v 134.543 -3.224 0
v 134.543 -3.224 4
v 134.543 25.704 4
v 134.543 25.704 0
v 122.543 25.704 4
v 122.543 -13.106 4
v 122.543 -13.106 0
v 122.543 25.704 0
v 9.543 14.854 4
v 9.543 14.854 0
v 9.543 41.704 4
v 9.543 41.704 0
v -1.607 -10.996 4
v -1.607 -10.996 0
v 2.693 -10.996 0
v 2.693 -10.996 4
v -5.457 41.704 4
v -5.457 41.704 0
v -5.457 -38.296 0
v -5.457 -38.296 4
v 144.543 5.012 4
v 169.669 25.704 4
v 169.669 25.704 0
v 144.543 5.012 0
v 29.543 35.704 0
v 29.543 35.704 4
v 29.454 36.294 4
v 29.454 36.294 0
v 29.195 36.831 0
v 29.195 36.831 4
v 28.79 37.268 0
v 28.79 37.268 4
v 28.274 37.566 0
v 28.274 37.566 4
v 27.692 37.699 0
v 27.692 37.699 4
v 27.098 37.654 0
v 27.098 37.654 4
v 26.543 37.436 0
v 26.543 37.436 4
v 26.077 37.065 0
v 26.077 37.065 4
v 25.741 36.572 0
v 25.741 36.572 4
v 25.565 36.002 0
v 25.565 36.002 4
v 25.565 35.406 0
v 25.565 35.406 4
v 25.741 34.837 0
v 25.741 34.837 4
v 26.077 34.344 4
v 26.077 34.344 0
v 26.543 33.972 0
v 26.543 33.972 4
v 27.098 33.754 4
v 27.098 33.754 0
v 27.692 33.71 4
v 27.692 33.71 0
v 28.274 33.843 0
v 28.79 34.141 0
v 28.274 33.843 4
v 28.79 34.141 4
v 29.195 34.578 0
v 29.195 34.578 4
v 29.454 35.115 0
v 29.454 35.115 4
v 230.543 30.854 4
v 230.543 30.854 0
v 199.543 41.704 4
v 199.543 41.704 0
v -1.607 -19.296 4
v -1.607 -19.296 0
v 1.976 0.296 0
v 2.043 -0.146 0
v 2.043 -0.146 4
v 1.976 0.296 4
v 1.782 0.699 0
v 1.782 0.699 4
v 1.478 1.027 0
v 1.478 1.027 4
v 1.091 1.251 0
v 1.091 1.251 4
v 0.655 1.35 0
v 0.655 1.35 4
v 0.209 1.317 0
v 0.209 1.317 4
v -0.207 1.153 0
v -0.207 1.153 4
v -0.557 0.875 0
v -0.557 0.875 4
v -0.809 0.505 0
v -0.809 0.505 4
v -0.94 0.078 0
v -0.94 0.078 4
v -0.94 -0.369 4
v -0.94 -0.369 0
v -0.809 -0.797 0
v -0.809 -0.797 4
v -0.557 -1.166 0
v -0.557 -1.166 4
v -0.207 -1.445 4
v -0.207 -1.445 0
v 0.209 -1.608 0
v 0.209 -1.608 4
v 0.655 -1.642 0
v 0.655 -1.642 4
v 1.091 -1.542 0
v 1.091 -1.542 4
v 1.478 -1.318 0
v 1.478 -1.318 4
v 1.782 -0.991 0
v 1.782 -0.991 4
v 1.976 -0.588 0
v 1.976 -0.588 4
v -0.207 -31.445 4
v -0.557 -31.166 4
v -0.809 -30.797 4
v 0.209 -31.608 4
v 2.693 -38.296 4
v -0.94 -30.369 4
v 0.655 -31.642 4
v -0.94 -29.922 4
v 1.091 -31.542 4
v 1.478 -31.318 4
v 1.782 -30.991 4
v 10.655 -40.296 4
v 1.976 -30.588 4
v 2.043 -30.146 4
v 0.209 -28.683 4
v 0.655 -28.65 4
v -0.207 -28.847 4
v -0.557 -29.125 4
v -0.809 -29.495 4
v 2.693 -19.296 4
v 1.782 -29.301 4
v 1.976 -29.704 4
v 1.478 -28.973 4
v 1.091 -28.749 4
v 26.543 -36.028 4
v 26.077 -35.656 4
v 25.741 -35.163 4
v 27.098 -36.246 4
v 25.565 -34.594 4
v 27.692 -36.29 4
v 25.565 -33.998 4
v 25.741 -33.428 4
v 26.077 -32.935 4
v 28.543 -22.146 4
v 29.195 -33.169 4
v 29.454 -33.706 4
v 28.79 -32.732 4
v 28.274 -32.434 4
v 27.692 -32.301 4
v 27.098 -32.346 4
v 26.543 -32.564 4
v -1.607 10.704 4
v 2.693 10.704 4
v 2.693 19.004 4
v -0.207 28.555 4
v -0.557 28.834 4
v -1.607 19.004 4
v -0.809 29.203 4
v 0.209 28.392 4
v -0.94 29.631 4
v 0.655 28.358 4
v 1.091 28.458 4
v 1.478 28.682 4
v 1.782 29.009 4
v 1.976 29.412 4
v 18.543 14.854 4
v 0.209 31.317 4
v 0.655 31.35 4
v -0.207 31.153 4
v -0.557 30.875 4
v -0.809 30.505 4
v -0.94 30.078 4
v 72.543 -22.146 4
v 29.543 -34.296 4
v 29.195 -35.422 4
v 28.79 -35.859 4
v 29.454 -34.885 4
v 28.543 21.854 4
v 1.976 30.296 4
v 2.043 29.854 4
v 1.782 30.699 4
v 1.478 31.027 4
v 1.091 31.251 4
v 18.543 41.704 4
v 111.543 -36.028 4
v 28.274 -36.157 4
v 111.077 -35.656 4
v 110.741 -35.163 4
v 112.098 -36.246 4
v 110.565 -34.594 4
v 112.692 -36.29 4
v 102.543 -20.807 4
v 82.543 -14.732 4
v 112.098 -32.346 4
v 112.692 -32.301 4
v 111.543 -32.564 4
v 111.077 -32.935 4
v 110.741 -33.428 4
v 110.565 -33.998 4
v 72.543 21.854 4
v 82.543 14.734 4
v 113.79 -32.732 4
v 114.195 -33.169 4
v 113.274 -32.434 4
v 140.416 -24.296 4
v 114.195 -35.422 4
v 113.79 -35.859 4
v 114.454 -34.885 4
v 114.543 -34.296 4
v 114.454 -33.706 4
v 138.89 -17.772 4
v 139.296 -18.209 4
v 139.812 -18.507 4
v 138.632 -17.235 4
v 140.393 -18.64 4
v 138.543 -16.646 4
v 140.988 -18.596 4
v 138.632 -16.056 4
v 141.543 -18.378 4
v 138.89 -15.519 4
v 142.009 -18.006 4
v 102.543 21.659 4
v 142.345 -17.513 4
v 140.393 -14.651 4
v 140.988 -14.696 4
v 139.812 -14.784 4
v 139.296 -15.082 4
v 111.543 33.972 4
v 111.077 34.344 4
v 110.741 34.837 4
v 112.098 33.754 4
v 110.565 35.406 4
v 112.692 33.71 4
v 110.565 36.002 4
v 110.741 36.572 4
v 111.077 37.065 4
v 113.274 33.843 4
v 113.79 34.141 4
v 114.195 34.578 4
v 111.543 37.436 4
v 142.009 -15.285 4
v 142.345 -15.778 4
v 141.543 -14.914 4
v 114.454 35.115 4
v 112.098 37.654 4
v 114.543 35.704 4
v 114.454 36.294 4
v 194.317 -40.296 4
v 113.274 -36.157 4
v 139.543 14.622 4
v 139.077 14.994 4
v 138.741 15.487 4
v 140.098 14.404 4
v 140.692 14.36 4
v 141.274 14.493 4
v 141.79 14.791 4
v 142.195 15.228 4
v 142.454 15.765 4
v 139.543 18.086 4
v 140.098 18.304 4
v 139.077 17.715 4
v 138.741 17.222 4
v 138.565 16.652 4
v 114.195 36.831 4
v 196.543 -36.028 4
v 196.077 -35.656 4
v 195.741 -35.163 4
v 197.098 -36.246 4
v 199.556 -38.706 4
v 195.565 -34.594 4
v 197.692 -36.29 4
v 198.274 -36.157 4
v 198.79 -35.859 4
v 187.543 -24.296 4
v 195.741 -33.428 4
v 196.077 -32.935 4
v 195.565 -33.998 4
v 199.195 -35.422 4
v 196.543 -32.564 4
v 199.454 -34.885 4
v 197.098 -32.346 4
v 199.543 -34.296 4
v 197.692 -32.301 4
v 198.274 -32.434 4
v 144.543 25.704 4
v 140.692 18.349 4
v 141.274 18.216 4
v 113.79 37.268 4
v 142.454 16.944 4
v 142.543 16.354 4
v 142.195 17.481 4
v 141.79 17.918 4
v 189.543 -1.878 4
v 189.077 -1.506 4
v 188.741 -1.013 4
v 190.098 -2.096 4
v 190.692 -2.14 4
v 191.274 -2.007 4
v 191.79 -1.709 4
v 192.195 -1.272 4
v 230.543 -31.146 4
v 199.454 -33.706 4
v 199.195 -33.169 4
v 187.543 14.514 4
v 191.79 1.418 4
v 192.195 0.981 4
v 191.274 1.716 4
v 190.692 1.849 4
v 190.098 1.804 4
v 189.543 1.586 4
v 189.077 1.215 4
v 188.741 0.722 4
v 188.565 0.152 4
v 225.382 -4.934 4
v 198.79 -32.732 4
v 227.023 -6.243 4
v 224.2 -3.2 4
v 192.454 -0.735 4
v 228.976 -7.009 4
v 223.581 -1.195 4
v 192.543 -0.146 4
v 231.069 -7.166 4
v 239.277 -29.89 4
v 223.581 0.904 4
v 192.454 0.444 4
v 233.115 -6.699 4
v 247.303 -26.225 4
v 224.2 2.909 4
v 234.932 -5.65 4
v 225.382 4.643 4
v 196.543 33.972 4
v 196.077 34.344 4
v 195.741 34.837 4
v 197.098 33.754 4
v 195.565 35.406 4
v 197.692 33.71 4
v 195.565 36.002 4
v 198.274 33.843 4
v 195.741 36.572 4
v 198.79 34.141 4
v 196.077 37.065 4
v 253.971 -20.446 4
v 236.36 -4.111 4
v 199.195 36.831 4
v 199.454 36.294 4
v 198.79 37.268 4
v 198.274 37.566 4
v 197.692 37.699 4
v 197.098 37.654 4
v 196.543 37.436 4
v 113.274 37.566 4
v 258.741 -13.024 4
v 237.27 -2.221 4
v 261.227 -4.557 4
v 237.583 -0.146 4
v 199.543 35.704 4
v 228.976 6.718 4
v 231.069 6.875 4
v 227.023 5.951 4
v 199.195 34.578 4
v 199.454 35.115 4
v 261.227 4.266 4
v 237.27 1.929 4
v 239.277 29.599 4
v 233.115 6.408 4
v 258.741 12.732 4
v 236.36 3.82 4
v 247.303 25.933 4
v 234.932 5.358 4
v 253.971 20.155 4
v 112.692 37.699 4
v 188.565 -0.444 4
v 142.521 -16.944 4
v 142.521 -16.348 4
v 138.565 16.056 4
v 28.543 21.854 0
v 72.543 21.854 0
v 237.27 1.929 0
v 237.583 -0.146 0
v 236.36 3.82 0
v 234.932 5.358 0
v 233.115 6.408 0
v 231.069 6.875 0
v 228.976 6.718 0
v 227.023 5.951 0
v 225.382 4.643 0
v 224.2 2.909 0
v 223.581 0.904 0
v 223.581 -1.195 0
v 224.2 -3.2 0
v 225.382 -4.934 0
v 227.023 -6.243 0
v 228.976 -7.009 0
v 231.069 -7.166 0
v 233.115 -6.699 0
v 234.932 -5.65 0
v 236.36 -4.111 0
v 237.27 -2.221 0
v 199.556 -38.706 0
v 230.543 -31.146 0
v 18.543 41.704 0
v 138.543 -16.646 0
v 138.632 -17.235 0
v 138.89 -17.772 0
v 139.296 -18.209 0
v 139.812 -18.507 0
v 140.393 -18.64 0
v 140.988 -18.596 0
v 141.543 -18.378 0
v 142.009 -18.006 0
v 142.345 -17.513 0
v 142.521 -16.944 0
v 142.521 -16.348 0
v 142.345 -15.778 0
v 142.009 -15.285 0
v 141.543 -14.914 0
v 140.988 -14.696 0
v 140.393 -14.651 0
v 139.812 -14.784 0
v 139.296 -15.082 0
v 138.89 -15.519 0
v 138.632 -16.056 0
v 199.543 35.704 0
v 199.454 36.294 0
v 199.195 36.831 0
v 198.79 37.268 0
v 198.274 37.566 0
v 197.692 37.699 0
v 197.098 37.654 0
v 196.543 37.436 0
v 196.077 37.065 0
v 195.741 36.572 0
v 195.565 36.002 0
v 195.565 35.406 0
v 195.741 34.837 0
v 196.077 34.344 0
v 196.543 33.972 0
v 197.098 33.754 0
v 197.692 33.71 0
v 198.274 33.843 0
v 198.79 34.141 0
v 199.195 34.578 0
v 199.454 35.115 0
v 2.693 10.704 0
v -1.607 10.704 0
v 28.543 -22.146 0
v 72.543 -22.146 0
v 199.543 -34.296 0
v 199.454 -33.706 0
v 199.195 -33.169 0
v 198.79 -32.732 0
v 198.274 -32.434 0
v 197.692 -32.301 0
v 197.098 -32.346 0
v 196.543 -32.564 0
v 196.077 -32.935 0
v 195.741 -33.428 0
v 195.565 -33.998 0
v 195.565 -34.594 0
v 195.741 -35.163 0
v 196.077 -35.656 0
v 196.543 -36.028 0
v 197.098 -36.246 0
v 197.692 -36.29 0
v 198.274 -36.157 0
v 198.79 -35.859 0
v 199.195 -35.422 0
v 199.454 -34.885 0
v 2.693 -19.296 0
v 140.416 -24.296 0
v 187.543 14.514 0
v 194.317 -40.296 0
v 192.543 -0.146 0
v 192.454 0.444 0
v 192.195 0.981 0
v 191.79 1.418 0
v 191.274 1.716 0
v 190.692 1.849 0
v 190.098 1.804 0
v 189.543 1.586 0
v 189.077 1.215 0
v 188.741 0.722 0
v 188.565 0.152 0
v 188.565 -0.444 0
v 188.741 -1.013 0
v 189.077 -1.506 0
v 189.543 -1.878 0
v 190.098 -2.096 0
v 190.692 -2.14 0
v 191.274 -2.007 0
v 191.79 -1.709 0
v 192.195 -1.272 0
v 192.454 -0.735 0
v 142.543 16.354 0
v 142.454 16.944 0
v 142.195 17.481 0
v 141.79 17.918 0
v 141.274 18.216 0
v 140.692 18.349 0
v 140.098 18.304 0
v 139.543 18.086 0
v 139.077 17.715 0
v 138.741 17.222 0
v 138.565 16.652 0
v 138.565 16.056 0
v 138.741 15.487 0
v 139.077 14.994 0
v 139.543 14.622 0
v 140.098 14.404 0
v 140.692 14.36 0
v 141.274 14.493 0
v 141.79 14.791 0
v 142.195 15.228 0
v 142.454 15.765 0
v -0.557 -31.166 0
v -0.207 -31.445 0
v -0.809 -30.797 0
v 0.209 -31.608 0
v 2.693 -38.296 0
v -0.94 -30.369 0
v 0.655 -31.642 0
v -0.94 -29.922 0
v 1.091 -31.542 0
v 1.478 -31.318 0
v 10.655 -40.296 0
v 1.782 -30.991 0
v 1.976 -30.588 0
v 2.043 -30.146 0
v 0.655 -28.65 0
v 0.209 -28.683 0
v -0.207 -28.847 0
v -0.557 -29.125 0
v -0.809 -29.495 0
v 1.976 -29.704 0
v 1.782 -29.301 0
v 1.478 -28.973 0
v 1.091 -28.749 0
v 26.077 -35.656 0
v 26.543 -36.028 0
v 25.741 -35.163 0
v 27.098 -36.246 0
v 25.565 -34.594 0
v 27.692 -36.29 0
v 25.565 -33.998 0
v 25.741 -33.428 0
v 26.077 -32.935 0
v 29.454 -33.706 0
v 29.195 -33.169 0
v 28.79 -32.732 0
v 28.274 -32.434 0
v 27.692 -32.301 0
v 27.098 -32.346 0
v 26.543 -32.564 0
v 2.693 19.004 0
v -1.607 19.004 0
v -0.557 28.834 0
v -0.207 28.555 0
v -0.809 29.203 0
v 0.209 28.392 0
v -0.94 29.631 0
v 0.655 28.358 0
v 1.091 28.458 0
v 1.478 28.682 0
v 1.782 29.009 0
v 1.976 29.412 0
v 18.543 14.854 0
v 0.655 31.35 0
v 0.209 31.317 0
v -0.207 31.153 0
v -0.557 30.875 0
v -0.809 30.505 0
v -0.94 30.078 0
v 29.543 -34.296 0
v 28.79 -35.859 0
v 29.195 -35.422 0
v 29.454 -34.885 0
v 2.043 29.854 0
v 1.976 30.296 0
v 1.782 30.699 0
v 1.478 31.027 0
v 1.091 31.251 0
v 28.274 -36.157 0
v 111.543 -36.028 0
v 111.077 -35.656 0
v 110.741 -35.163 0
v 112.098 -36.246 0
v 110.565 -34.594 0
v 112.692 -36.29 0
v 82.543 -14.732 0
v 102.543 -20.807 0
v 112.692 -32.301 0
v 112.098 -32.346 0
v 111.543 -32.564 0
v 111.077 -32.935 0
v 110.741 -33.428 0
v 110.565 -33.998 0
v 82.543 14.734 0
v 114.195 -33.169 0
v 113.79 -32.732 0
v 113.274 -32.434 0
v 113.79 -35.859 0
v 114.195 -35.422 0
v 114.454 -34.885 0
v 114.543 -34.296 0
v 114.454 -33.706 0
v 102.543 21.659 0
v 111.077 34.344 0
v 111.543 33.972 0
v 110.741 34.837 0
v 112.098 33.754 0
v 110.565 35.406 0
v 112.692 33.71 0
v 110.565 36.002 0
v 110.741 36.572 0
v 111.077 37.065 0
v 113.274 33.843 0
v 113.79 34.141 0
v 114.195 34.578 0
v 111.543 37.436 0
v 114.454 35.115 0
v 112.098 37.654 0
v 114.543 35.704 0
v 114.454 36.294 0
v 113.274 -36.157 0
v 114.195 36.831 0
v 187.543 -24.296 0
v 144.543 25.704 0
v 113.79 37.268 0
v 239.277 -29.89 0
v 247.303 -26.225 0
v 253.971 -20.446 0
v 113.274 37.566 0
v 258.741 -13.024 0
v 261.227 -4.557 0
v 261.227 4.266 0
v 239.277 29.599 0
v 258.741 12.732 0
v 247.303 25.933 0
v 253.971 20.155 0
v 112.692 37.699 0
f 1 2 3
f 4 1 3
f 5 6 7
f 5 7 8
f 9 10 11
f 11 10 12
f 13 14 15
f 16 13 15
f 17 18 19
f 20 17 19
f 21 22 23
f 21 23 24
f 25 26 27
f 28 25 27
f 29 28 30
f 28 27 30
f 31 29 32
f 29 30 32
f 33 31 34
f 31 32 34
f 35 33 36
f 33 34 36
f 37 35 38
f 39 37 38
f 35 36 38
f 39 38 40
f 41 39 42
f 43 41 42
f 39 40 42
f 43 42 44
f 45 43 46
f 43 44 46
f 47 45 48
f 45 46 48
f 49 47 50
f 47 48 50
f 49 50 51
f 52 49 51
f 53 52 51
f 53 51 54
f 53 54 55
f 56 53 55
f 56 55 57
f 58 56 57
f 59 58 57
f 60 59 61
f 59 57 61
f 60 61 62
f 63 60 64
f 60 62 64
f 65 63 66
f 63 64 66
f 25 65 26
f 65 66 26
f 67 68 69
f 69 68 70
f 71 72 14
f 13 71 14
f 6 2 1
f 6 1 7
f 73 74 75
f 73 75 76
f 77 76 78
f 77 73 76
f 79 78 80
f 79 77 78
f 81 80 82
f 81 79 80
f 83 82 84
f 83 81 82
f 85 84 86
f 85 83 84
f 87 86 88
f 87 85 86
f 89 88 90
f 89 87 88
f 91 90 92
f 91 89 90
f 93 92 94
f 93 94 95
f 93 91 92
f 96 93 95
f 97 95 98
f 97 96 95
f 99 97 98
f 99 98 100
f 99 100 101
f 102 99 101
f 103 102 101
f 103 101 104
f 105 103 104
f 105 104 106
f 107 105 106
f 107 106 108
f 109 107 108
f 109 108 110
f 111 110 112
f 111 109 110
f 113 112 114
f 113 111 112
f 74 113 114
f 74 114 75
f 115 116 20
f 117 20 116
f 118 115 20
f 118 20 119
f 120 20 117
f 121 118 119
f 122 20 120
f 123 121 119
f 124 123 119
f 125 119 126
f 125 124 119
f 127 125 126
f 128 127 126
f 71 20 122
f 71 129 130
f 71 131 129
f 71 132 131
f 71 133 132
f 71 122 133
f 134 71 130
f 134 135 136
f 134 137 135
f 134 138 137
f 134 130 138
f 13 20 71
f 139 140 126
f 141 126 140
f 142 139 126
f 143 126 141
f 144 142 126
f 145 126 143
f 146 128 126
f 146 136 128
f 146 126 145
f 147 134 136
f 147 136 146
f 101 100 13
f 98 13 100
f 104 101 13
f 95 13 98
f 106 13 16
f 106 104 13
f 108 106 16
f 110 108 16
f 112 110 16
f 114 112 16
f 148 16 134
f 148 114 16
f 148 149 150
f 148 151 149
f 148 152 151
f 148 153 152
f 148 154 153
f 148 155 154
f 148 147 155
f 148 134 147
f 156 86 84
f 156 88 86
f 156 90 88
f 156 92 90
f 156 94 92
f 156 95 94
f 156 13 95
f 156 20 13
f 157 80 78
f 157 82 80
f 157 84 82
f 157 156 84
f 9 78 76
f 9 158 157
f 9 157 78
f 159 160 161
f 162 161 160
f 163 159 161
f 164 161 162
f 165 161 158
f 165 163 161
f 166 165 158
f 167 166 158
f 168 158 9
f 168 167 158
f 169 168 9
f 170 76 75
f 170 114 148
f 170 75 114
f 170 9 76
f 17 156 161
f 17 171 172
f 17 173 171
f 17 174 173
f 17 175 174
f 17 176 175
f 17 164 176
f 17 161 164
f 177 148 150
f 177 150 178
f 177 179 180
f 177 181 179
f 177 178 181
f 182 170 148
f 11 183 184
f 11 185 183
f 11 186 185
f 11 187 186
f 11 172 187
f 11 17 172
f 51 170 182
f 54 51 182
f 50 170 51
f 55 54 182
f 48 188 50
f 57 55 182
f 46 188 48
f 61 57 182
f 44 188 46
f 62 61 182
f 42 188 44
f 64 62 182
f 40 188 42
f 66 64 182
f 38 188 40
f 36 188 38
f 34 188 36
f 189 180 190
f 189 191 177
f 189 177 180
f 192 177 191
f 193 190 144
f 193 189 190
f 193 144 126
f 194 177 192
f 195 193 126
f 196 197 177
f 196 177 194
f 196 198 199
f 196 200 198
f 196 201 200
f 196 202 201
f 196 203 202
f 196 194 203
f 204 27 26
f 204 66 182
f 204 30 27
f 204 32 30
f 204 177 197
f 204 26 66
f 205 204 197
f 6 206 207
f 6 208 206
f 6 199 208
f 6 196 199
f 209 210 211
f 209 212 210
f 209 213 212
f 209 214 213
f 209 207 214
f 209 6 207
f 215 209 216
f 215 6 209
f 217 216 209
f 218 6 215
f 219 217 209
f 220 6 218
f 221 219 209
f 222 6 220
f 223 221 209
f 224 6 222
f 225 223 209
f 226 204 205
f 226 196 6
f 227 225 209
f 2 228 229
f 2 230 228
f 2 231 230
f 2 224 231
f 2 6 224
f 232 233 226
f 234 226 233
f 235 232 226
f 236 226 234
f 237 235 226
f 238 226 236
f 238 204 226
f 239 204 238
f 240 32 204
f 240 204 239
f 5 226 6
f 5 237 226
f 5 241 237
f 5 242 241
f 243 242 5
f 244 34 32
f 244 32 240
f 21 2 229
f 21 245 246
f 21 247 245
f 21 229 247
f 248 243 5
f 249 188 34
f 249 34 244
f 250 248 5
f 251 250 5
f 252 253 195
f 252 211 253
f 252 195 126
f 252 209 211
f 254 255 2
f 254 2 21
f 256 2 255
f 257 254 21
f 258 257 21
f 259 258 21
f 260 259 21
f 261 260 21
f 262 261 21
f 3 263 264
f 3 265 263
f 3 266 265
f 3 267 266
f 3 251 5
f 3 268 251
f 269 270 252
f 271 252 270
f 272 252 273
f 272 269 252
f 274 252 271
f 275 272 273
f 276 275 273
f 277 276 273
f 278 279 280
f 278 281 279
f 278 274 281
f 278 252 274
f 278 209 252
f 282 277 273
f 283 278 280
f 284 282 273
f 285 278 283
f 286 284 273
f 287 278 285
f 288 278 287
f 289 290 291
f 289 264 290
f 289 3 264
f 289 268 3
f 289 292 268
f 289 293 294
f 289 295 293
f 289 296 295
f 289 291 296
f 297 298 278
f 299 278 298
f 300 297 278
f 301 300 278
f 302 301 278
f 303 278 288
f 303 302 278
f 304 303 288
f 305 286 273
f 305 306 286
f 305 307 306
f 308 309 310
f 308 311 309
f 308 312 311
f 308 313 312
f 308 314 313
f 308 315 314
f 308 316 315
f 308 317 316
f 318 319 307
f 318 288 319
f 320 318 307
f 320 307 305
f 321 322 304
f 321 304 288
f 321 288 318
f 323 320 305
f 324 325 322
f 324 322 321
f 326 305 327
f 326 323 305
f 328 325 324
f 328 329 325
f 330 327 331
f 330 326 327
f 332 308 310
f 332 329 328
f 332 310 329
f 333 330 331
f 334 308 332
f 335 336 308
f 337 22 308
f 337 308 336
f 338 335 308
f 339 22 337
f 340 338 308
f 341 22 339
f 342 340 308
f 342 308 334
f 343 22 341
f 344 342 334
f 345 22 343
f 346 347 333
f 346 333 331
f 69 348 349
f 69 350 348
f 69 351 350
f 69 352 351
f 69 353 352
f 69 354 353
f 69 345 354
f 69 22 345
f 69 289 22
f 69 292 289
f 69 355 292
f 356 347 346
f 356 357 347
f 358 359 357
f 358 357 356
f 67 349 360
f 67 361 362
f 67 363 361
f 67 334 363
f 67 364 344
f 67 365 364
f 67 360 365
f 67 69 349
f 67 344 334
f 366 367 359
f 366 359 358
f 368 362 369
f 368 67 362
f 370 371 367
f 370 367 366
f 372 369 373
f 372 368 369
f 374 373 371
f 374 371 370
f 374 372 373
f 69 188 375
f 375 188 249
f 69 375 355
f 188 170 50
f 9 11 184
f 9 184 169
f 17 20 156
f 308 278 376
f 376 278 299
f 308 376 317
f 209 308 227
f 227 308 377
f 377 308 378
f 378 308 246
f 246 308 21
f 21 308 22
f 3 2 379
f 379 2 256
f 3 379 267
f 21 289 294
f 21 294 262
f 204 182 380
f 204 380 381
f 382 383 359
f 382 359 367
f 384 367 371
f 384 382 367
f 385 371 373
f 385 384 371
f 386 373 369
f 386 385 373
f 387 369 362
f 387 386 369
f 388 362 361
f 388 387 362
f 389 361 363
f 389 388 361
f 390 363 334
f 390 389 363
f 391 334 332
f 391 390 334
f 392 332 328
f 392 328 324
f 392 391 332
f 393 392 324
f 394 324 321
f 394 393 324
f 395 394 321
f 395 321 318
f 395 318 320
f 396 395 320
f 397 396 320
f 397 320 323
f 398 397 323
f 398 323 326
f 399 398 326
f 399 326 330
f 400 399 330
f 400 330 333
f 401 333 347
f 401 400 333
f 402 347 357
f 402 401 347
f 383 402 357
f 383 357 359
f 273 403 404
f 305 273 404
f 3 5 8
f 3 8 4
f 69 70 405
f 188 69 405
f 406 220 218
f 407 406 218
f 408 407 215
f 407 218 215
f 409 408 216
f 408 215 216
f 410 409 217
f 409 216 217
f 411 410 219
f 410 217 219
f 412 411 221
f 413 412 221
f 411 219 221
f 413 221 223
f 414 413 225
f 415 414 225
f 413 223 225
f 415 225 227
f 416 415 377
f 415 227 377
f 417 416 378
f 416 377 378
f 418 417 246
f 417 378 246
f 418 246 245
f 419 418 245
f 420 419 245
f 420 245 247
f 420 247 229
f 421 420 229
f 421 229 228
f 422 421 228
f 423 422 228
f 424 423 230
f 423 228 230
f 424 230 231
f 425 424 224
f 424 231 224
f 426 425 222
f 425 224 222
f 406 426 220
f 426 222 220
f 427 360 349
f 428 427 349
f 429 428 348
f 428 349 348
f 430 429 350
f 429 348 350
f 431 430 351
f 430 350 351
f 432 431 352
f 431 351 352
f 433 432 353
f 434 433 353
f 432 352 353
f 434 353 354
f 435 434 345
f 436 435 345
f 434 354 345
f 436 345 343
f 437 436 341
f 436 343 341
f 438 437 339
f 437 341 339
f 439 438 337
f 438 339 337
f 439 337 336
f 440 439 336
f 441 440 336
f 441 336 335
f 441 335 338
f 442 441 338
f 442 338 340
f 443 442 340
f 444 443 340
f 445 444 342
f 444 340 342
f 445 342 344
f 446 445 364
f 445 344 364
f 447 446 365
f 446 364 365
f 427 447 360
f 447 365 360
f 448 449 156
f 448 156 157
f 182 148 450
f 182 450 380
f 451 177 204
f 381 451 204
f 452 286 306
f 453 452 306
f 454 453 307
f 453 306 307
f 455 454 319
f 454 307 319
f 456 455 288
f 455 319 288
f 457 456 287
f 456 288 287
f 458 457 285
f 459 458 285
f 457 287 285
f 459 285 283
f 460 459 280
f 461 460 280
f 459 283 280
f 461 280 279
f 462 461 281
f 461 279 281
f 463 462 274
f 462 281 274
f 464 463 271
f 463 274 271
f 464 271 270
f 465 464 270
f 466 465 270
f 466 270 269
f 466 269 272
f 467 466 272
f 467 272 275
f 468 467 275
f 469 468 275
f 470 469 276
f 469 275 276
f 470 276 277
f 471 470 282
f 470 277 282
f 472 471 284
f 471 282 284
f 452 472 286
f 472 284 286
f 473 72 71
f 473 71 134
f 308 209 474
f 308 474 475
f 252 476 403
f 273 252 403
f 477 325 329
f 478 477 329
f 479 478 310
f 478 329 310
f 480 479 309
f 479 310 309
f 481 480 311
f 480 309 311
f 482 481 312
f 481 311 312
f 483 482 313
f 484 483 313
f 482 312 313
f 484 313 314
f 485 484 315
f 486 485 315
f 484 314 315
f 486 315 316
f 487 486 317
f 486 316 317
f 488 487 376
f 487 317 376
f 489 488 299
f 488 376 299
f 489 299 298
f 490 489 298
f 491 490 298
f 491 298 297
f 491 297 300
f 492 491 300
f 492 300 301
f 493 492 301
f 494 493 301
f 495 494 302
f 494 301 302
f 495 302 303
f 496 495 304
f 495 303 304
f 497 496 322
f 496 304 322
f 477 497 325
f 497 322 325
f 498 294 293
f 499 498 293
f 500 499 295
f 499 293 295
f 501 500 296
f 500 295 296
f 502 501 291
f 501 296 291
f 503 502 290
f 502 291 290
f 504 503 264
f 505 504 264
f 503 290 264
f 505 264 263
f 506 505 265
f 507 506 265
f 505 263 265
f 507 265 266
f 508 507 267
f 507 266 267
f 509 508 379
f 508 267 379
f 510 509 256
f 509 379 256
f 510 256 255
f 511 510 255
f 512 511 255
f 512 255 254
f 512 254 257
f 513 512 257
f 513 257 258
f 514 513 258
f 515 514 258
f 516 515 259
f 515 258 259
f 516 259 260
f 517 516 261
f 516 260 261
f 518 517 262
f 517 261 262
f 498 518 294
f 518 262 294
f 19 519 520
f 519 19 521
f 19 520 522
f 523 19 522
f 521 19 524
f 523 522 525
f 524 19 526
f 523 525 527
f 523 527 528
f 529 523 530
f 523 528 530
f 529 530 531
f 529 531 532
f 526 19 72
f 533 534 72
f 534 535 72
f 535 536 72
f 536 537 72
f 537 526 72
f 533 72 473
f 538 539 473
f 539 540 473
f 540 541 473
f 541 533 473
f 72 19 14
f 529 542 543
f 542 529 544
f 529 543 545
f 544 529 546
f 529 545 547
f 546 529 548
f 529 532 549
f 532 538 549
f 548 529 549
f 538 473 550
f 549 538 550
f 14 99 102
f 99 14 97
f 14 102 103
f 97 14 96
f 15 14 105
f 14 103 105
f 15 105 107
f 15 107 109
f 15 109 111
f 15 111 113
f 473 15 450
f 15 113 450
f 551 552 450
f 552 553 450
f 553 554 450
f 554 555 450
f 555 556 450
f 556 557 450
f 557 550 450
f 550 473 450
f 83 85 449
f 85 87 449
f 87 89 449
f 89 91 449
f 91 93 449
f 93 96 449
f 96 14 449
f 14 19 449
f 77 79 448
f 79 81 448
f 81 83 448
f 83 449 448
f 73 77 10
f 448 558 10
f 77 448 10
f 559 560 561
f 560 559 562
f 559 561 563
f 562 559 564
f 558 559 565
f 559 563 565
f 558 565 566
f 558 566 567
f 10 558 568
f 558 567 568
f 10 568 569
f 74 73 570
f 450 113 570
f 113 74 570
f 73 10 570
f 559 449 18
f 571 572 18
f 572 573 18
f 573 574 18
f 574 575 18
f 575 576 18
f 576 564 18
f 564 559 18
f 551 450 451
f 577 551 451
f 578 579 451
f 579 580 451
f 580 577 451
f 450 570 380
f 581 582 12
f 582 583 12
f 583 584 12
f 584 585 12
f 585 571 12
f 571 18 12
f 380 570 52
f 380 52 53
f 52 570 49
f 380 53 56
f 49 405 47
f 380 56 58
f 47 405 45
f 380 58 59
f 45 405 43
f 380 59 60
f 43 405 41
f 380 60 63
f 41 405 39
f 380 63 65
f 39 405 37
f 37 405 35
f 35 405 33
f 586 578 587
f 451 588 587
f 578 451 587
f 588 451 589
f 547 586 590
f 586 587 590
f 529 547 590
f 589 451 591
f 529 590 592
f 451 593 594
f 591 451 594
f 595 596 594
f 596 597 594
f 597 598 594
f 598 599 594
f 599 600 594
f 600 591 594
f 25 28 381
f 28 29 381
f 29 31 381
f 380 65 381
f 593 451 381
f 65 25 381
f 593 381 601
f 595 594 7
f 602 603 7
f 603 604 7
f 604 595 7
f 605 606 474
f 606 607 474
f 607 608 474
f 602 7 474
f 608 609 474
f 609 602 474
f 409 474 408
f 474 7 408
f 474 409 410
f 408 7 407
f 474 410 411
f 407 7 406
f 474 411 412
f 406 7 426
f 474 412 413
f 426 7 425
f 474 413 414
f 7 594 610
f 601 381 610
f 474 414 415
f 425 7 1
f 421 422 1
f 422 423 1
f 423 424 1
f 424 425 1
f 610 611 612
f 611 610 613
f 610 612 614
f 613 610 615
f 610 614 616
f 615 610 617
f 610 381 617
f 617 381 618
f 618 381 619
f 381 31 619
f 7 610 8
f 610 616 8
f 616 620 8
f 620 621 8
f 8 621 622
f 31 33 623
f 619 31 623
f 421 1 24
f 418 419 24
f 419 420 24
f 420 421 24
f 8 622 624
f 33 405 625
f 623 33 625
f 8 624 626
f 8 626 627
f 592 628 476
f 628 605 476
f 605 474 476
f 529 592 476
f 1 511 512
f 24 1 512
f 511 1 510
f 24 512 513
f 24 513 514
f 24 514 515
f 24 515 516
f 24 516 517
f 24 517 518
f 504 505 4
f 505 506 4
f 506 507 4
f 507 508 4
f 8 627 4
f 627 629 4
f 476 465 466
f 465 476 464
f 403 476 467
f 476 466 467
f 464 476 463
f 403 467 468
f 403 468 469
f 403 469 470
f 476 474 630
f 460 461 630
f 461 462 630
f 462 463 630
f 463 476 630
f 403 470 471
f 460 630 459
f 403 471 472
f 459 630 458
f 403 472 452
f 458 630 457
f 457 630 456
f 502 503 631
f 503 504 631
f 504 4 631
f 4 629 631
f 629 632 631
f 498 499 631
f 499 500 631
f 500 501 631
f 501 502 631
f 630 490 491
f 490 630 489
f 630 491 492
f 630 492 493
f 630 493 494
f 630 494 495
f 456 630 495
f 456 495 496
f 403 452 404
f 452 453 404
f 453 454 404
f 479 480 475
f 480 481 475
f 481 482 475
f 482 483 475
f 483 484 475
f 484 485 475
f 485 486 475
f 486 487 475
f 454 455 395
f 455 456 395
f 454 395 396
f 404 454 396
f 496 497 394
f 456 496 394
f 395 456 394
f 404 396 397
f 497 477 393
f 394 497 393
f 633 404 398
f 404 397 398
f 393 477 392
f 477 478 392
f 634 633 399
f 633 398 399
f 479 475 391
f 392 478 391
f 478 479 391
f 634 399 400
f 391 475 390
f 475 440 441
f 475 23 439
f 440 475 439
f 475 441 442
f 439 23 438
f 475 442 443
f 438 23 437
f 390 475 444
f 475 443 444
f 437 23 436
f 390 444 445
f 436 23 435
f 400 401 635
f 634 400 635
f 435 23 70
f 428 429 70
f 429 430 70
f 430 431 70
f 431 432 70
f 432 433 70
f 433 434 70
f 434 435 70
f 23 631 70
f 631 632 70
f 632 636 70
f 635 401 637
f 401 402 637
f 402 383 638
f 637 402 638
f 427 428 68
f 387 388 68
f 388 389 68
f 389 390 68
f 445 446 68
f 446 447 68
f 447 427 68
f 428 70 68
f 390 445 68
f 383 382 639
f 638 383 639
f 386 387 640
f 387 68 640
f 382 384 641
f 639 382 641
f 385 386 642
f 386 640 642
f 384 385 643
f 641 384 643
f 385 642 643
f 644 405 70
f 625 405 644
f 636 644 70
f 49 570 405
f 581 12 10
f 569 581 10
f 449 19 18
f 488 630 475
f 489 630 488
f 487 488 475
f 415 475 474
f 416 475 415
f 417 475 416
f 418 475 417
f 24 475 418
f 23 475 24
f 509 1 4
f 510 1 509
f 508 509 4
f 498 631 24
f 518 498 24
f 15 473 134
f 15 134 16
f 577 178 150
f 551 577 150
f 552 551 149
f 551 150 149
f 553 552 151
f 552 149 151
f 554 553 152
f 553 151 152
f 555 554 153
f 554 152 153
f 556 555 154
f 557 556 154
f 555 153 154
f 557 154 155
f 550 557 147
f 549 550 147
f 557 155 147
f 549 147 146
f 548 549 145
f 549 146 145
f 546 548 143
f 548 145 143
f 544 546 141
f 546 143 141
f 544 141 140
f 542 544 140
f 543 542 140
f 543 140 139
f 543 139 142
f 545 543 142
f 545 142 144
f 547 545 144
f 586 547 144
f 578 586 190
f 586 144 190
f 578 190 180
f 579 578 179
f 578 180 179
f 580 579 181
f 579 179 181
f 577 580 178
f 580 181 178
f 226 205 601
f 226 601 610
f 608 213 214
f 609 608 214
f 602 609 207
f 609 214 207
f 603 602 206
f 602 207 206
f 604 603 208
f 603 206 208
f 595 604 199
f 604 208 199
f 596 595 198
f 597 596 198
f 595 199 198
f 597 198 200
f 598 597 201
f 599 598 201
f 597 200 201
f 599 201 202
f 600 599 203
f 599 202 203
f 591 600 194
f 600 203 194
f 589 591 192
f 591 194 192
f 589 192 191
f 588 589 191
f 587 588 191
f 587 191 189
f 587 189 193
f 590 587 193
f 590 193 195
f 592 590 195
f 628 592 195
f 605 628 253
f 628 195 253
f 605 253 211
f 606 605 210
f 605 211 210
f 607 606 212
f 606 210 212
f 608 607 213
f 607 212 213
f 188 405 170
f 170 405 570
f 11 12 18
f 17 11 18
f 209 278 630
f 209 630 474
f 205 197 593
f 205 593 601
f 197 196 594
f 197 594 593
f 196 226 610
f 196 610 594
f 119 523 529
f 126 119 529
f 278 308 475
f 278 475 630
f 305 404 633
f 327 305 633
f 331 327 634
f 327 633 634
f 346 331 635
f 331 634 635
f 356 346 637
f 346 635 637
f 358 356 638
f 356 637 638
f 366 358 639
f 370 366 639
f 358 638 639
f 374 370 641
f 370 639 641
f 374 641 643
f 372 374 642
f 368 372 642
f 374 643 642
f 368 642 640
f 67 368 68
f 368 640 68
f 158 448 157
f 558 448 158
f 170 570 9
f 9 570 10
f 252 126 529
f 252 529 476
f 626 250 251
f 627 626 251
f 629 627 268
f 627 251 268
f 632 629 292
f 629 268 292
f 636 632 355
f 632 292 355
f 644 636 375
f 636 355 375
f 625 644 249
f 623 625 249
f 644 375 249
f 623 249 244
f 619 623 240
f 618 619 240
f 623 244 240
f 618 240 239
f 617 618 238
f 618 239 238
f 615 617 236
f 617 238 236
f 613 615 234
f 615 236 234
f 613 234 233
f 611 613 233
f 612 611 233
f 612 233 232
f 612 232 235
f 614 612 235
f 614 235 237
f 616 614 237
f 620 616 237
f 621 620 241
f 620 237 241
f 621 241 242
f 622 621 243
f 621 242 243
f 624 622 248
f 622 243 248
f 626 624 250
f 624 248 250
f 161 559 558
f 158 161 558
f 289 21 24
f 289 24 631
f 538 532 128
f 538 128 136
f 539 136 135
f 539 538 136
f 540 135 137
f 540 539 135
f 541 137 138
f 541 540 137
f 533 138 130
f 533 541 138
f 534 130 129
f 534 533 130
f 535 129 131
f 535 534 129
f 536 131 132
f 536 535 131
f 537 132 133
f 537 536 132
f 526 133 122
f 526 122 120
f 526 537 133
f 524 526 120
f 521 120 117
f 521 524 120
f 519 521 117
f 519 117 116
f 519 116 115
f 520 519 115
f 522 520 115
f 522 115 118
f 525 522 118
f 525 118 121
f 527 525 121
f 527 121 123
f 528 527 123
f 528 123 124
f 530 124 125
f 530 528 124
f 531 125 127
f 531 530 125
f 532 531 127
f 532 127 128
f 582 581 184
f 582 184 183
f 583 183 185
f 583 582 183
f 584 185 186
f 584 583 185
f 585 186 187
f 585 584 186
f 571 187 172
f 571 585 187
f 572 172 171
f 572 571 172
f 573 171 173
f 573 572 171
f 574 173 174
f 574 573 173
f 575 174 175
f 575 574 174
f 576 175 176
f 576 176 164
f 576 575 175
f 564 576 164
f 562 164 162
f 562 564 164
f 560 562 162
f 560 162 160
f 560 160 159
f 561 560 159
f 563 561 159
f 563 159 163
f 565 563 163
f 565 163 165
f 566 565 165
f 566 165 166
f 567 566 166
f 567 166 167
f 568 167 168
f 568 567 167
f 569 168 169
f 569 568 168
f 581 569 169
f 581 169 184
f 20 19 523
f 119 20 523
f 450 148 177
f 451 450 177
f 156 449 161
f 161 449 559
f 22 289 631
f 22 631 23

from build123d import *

# Parameters (mm, degrees)
EXTRUDE_1_OUTLINE_R   = 1.5
EXTRUDE_1_OUTLINE_W   = 4.3
EXTRUDE_1_OUTLINE_H   = 8.3
EXTRUDE_1_OUTLINE_R_2 = 11.5
EXTRUDE_1_OUTLINE_R_3 = 7.04
EXTRUDE_1_DEPTH       = 4
SKETCH_2_W            = 44
SKETCH_2_H            = 44
CUT_EXTRUDE_1_DEPTH   = 4
SKETCH_3_R            = 2
CUT_EXTRUDE_2_DEPTH   = 4
SKETCH_4_W            = 10
SKETCH_4_H            = 47.093490756
EXTRUDE_2_DEPTH       = 4
SKETCH_7_R            = 2
CUT_EXTRUDE_3_DEPTH   = 4


# Read off the part's stored shape, not the designer's step: 凸台-拉伸1
with BuildPart() as part:
    # 凸台-拉伸1 outline → 凸台-拉伸1 (new body)
    with BuildSketch(Plane.XY):
        with BuildLine():
            Line((174.542857143, -46.295714286), (199.556073527, -38.70591431))
            Line((199.556073527, -38.70591431), (230.542857143, -31.145714286))
            ThreePointArc((230.542857143, -31.145714286), (261.542857143, -0.145714286), (230.542857143, 30.854285714))
            Line((230.542857143, 30.854285714), (199.542857143, 41.704285714))
            Line((199.542857143, 41.704285714), (18.542857143, 41.704285714))
            Line((18.542857143, 41.704285714), (18.542857143, 14.854285714))
            Line((18.542857143, 14.854285714), (9.542857143, 14.854285714))
            Line((9.542857143, 14.854285714), (9.542857143, 41.704285714))
            Line((9.542857143, 41.704285714), (-5.457142857, 41.704285714))
            Line((-5.457142857, 41.704285714), (-5.457142857, -38.295714286))
            Line((-5.457142857, -38.295714286), (2.692857143, -38.295714286))
            Line((2.692857143, -38.295714286), (34.542857143, -46.295714286))
            Line((34.542857143, -46.295714286), (174.542857143, -46.295714286))
        make_face()
        with Locations((0.542857143, -30.145714286)):
            Circle(EXTRUDE_1_OUTLINE_R, mode=Mode.SUBTRACT)
        with Locations((0.542857143, -15.145714286)):
            Rectangle(EXTRUDE_1_OUTLINE_W, EXTRUDE_1_OUTLINE_H, mode=Mode.SUBTRACT)
        with Locations((50.542857143, -14.145714286)):
            Circle(EXTRUDE_1_OUTLINE_R, mode=Mode.SUBTRACT)
        with Locations((0.542857143, -0.145714286)):
            Circle(EXTRUDE_1_OUTLINE_R, mode=Mode.SUBTRACT)
        with Locations((36.542857143, -0.145714286)):
            Circle(EXTRUDE_1_OUTLINE_R, mode=Mode.SUBTRACT)
        with Locations((50.542857143, -0.145714286)):
            Circle(EXTRUDE_1_OUTLINE_R_2, mode=Mode.SUBTRACT)
        with Locations((0.542857143, 14.854285714)):
            Rectangle(EXTRUDE_1_OUTLINE_W, EXTRUDE_1_OUTLINE_H, mode=Mode.SUBTRACT)
        with Locations((50.542857143, 13.854285714)):
            Circle(EXTRUDE_1_OUTLINE_R, mode=Mode.SUBTRACT)
        with Locations((64.542857143, -0.145714286)):
            Circle(EXTRUDE_1_OUTLINE_R, mode=Mode.SUBTRACT)
        with Locations((0.542857143, 29.854285714)):
            Circle(EXTRUDE_1_OUTLINE_R, mode=Mode.SUBTRACT)
        with Locations((230.542857143, -0.145714286)):
            Circle(EXTRUDE_1_OUTLINE_R_3, mode=Mode.SUBTRACT)
    extrude(amount=EXTRUDE_1_DEPTH)

    # 草图2 → 切除-拉伸1 (cut)
    with BuildSketch(Plane.XY.offset(4)):
        with Locations((50.542857143, -0.145714286)):
            Rectangle(SKETCH_2_W, SKETCH_2_H)
    extrude(amount=-CUT_EXTRUDE_1_DEPTH, mode=Mode.SUBTRACT)

    # 草图3 → 切除-拉伸2 (cut)
    with BuildSketch(Plane.XY.offset(4)):
        with Locations((27.542857143, 35.704285714)):
            Circle(SKETCH_3_R)
        with Locations((112.542857143, 35.704285714)):
            Circle(SKETCH_3_R)
        with Locations((197.542857143, 35.704285714)):
            Circle(SKETCH_3_R)
        with Locations((112.542857143, -34.295714286)):
            Circle(SKETCH_3_R)
        with Locations((197.542857143, -34.295714286)):
            Circle(SKETCH_3_R)
        with Locations((27.542857143, -34.295714286)):
            Circle(SKETCH_3_R)
        Polygon((187.542857143, -24.295714286), (140.41622539, -24.295714286), (187.542857143, 14.51445304), align=None)
        Polygon((122.542857143, 25.704285714), (169.669488896, 25.704285714), (122.542857143, -13.105881612), align=None)
        Polygon((82.542857143, 14.734304613), (102.542857143, 21.659304613), (102.542857143, -20.807070509), (82.542857143, -14.732070509), align=None)
    extrude(amount=-CUT_EXTRUDE_2_DEPTH, mode=Mode.SUBTRACT)

    # 草图4 → 凸台-拉伸2 (add)
    with BuildSketch(Plane.XY.offset(4)):
        with Locations((139.542857143, 15.704285714)):
            Rectangle(SKETCH_4_W, SKETCH_4_H)
    extrude(amount=-EXTRUDE_2_DEPTH)

    # 草图7 → 切除-拉伸3 (cut)
    with BuildSketch(Plane.XY.offset(4)):
        with Locations((190.542857143, -0.145714286)):
            Circle(SKETCH_7_R)
        with Locations((140.542857143, 16.354285714)):
            Circle(SKETCH_7_R)
        with Locations(Location((140.542857143, -16.645714286, 0), (0, 0, 180))):
            Circle(SKETCH_7_R)
        Polygon((10.655357143, -40.295714286), (194.316671838, -40.295714286), (206.19710926, -67.618852766), (10.655357143, -65.874099546), align=None)
    extrude(amount=-CUT_EXTRUDE_3_DEPTH, mode=Mode.SUBTRACT)


solid = part.part
